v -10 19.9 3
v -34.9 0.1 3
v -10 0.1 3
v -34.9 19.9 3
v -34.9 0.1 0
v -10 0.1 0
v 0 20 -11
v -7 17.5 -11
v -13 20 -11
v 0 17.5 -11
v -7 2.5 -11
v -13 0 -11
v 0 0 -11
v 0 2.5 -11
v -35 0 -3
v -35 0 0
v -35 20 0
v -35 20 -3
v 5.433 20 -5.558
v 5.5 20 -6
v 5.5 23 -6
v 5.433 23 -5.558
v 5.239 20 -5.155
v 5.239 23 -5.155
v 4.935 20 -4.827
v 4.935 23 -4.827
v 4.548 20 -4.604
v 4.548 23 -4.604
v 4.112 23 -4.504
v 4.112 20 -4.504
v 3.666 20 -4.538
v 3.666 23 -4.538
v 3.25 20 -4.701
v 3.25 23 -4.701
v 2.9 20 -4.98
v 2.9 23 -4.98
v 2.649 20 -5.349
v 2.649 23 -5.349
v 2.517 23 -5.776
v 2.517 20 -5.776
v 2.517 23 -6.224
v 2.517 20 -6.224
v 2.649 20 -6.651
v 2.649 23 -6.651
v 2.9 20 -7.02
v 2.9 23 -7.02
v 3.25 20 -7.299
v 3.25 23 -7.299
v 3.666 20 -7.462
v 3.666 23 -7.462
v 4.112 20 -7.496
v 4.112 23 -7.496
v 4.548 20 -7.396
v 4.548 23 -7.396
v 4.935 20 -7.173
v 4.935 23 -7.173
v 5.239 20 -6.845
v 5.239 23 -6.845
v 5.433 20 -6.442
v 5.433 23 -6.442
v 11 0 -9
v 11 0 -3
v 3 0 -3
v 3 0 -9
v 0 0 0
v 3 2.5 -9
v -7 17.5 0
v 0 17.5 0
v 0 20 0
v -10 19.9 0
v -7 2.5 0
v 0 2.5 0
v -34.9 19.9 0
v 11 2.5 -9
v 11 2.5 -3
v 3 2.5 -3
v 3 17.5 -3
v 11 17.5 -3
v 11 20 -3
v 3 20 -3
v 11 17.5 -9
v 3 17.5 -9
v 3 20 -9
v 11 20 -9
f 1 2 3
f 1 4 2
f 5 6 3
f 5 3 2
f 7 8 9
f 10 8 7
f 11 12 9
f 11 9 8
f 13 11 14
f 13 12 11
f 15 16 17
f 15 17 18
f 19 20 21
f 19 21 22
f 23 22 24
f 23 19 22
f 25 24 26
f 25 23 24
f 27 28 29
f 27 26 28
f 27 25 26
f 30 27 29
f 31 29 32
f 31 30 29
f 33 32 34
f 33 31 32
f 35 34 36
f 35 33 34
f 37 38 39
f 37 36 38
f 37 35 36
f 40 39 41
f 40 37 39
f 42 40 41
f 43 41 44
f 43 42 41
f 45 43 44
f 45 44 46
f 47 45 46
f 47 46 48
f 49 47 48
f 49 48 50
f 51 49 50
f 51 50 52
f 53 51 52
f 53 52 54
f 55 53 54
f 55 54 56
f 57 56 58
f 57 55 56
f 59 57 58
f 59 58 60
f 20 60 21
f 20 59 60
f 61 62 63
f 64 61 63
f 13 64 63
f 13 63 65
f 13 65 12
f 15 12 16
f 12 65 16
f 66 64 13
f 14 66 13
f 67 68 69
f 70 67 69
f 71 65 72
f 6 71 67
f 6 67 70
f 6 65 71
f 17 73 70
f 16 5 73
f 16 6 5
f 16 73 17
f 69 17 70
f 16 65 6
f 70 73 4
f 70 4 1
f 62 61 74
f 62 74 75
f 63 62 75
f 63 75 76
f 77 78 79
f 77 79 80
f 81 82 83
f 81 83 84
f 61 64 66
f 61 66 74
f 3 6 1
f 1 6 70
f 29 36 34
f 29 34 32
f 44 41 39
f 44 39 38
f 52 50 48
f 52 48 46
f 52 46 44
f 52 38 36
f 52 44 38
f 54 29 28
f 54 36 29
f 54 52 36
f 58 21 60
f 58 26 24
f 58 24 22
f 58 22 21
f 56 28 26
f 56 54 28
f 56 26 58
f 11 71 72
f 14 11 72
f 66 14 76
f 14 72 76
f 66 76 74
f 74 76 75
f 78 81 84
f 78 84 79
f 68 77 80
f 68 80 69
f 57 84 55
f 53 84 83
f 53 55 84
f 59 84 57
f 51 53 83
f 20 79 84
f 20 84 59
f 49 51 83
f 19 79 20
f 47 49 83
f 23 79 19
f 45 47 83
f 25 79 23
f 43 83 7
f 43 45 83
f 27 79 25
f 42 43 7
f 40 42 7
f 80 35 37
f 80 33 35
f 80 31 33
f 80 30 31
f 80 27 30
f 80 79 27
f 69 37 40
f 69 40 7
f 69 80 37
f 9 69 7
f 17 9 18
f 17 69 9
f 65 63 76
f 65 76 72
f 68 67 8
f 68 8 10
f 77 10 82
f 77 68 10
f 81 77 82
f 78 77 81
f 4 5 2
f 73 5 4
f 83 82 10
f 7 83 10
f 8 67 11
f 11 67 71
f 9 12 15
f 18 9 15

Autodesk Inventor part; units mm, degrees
ref_plane "YZ Plane" through (0, 0, 0) normal (1, 0, 0) x (0, 1, 0)
ref_plane "XZ Plane" through (0, 0, 0) normal (0, 1, 0) x (-1, 0, 0)
ref_plane "XY Plane" through (0, 0, 0) normal (0, 0, 1) x (1, 0, 0)
sketch "Sketch1" plane through (0, 0, 0) normal (0, 1, 0) x (-1, 0, 0)
  point P0 (0, 0)
sketch "Sketch2" plane through (0, 0, 0) normal (0, 1, 0) x (-1, 0, 0)
  line L0 (0, 0) -> (35, 0)
  line L1 (35, 0) -> (35, -3)
  line L2 (13, -11) -> (35, -3)
  line L3 (13, -11) -> (0, -11)
  line L4 (-3, -9) -> (0, -11)
  line L5 (-3, -9) -> (-11, -9)
  line L6 (-11, -9) -> (-11, -3)
  line L7 (-11, -3) -> (-3, -3)
  line L8 (-3, -3) -> (0, 0)
  dimension "d0" = 35
  dimension "d1" = 3
  dimension "d8" = 6
extrude "Extrusion1" add sketch "Sketch2" along normal blind 20
sketch "Sketch3" plane through (0, 20, 0) normal (0, 1, 0) x (1, 0, 0)
  line L0 (11, 9) -> (11, 3) projected
  line L1 (11, 6) -> (4, 6)
  circle A0 centre (4, 6) radius 1.5
  dimension "d11" = 7
  dimension "d12" = 3
extrude "Extrusion2" add sketch "Sketch3" along normal blind 3
sketch "Sketch4" plane through (-35, 0, 0) normal (0, 0, 1) x (1, 0, 0)
  line L0 (46, 0) -> (46, 20) projected
  line L1 (46, 10) -> (28, 10)
  line L2 (28, 10) -> (28, 17.5)
  line L3 (28, 17.5) -> (28, 2.5)
  line L4 (28, 2.5) -> (46, 2.5)
  line L5 (28, 17.5) -> (46, 17.5)
  line L6 (46, 2.5) -> (46, 17.5)
  dimension "d15" = 18
  dimension "d16" = 7.5
  dimension "d17" = 15
extrude "Extrusion3" cut sketch "Sketch4" against normal through all
sketch "Sketch5" plane through (-35, 0, 0) normal (0, 0, 1) x (1, 0, 0)
  line L0 (28, 17.5) -> (35, 17.5) projected
  line L1 (35, 17.5) -> (35, 20) projected
  line L2 (0, 20) -> (35, 20) projected
  line L3 (35, 0) -> (35, 2.5) projected
  line L4 (35, 2.5) -> (28, 2.5) projected
  line L5 (28, 2.5) -> (28, 17.5) projected
  line L6 (0, 0) -> (25, 0)
  line L7 (25, 0.1) -> (25, 19.9)
  line L8 (25, 20) -> (0, 20)
  line L9 (0, 20) -> (0, 0)
  line L10 (34.9, 19.9) -> (34.9, 17.6)
  line L11 (34.9, 17.6) -> (27.9, 17.6)
  line L12 (27.9, 17.6) -> (27.9, 2.4)
  line L13 (27.9, 2.4) -> (34.9, 2.4)
  line L14 (34.9, 2.4) -> (34.9, 0.1)
  line L15 (25, 0.1) -> (0.1, 0.1)
  line L16 (0.1, 0.1) -> (0.1, 19.9)
  line L17 (0.1, 19.9) -> (25, 19.9)
  dimension "d20" = 25
  dimension "d21" = 0.1
extrude "Extrusion4" add sketch "Sketch5" along normal blind 3
properties part number "EE Claw"
